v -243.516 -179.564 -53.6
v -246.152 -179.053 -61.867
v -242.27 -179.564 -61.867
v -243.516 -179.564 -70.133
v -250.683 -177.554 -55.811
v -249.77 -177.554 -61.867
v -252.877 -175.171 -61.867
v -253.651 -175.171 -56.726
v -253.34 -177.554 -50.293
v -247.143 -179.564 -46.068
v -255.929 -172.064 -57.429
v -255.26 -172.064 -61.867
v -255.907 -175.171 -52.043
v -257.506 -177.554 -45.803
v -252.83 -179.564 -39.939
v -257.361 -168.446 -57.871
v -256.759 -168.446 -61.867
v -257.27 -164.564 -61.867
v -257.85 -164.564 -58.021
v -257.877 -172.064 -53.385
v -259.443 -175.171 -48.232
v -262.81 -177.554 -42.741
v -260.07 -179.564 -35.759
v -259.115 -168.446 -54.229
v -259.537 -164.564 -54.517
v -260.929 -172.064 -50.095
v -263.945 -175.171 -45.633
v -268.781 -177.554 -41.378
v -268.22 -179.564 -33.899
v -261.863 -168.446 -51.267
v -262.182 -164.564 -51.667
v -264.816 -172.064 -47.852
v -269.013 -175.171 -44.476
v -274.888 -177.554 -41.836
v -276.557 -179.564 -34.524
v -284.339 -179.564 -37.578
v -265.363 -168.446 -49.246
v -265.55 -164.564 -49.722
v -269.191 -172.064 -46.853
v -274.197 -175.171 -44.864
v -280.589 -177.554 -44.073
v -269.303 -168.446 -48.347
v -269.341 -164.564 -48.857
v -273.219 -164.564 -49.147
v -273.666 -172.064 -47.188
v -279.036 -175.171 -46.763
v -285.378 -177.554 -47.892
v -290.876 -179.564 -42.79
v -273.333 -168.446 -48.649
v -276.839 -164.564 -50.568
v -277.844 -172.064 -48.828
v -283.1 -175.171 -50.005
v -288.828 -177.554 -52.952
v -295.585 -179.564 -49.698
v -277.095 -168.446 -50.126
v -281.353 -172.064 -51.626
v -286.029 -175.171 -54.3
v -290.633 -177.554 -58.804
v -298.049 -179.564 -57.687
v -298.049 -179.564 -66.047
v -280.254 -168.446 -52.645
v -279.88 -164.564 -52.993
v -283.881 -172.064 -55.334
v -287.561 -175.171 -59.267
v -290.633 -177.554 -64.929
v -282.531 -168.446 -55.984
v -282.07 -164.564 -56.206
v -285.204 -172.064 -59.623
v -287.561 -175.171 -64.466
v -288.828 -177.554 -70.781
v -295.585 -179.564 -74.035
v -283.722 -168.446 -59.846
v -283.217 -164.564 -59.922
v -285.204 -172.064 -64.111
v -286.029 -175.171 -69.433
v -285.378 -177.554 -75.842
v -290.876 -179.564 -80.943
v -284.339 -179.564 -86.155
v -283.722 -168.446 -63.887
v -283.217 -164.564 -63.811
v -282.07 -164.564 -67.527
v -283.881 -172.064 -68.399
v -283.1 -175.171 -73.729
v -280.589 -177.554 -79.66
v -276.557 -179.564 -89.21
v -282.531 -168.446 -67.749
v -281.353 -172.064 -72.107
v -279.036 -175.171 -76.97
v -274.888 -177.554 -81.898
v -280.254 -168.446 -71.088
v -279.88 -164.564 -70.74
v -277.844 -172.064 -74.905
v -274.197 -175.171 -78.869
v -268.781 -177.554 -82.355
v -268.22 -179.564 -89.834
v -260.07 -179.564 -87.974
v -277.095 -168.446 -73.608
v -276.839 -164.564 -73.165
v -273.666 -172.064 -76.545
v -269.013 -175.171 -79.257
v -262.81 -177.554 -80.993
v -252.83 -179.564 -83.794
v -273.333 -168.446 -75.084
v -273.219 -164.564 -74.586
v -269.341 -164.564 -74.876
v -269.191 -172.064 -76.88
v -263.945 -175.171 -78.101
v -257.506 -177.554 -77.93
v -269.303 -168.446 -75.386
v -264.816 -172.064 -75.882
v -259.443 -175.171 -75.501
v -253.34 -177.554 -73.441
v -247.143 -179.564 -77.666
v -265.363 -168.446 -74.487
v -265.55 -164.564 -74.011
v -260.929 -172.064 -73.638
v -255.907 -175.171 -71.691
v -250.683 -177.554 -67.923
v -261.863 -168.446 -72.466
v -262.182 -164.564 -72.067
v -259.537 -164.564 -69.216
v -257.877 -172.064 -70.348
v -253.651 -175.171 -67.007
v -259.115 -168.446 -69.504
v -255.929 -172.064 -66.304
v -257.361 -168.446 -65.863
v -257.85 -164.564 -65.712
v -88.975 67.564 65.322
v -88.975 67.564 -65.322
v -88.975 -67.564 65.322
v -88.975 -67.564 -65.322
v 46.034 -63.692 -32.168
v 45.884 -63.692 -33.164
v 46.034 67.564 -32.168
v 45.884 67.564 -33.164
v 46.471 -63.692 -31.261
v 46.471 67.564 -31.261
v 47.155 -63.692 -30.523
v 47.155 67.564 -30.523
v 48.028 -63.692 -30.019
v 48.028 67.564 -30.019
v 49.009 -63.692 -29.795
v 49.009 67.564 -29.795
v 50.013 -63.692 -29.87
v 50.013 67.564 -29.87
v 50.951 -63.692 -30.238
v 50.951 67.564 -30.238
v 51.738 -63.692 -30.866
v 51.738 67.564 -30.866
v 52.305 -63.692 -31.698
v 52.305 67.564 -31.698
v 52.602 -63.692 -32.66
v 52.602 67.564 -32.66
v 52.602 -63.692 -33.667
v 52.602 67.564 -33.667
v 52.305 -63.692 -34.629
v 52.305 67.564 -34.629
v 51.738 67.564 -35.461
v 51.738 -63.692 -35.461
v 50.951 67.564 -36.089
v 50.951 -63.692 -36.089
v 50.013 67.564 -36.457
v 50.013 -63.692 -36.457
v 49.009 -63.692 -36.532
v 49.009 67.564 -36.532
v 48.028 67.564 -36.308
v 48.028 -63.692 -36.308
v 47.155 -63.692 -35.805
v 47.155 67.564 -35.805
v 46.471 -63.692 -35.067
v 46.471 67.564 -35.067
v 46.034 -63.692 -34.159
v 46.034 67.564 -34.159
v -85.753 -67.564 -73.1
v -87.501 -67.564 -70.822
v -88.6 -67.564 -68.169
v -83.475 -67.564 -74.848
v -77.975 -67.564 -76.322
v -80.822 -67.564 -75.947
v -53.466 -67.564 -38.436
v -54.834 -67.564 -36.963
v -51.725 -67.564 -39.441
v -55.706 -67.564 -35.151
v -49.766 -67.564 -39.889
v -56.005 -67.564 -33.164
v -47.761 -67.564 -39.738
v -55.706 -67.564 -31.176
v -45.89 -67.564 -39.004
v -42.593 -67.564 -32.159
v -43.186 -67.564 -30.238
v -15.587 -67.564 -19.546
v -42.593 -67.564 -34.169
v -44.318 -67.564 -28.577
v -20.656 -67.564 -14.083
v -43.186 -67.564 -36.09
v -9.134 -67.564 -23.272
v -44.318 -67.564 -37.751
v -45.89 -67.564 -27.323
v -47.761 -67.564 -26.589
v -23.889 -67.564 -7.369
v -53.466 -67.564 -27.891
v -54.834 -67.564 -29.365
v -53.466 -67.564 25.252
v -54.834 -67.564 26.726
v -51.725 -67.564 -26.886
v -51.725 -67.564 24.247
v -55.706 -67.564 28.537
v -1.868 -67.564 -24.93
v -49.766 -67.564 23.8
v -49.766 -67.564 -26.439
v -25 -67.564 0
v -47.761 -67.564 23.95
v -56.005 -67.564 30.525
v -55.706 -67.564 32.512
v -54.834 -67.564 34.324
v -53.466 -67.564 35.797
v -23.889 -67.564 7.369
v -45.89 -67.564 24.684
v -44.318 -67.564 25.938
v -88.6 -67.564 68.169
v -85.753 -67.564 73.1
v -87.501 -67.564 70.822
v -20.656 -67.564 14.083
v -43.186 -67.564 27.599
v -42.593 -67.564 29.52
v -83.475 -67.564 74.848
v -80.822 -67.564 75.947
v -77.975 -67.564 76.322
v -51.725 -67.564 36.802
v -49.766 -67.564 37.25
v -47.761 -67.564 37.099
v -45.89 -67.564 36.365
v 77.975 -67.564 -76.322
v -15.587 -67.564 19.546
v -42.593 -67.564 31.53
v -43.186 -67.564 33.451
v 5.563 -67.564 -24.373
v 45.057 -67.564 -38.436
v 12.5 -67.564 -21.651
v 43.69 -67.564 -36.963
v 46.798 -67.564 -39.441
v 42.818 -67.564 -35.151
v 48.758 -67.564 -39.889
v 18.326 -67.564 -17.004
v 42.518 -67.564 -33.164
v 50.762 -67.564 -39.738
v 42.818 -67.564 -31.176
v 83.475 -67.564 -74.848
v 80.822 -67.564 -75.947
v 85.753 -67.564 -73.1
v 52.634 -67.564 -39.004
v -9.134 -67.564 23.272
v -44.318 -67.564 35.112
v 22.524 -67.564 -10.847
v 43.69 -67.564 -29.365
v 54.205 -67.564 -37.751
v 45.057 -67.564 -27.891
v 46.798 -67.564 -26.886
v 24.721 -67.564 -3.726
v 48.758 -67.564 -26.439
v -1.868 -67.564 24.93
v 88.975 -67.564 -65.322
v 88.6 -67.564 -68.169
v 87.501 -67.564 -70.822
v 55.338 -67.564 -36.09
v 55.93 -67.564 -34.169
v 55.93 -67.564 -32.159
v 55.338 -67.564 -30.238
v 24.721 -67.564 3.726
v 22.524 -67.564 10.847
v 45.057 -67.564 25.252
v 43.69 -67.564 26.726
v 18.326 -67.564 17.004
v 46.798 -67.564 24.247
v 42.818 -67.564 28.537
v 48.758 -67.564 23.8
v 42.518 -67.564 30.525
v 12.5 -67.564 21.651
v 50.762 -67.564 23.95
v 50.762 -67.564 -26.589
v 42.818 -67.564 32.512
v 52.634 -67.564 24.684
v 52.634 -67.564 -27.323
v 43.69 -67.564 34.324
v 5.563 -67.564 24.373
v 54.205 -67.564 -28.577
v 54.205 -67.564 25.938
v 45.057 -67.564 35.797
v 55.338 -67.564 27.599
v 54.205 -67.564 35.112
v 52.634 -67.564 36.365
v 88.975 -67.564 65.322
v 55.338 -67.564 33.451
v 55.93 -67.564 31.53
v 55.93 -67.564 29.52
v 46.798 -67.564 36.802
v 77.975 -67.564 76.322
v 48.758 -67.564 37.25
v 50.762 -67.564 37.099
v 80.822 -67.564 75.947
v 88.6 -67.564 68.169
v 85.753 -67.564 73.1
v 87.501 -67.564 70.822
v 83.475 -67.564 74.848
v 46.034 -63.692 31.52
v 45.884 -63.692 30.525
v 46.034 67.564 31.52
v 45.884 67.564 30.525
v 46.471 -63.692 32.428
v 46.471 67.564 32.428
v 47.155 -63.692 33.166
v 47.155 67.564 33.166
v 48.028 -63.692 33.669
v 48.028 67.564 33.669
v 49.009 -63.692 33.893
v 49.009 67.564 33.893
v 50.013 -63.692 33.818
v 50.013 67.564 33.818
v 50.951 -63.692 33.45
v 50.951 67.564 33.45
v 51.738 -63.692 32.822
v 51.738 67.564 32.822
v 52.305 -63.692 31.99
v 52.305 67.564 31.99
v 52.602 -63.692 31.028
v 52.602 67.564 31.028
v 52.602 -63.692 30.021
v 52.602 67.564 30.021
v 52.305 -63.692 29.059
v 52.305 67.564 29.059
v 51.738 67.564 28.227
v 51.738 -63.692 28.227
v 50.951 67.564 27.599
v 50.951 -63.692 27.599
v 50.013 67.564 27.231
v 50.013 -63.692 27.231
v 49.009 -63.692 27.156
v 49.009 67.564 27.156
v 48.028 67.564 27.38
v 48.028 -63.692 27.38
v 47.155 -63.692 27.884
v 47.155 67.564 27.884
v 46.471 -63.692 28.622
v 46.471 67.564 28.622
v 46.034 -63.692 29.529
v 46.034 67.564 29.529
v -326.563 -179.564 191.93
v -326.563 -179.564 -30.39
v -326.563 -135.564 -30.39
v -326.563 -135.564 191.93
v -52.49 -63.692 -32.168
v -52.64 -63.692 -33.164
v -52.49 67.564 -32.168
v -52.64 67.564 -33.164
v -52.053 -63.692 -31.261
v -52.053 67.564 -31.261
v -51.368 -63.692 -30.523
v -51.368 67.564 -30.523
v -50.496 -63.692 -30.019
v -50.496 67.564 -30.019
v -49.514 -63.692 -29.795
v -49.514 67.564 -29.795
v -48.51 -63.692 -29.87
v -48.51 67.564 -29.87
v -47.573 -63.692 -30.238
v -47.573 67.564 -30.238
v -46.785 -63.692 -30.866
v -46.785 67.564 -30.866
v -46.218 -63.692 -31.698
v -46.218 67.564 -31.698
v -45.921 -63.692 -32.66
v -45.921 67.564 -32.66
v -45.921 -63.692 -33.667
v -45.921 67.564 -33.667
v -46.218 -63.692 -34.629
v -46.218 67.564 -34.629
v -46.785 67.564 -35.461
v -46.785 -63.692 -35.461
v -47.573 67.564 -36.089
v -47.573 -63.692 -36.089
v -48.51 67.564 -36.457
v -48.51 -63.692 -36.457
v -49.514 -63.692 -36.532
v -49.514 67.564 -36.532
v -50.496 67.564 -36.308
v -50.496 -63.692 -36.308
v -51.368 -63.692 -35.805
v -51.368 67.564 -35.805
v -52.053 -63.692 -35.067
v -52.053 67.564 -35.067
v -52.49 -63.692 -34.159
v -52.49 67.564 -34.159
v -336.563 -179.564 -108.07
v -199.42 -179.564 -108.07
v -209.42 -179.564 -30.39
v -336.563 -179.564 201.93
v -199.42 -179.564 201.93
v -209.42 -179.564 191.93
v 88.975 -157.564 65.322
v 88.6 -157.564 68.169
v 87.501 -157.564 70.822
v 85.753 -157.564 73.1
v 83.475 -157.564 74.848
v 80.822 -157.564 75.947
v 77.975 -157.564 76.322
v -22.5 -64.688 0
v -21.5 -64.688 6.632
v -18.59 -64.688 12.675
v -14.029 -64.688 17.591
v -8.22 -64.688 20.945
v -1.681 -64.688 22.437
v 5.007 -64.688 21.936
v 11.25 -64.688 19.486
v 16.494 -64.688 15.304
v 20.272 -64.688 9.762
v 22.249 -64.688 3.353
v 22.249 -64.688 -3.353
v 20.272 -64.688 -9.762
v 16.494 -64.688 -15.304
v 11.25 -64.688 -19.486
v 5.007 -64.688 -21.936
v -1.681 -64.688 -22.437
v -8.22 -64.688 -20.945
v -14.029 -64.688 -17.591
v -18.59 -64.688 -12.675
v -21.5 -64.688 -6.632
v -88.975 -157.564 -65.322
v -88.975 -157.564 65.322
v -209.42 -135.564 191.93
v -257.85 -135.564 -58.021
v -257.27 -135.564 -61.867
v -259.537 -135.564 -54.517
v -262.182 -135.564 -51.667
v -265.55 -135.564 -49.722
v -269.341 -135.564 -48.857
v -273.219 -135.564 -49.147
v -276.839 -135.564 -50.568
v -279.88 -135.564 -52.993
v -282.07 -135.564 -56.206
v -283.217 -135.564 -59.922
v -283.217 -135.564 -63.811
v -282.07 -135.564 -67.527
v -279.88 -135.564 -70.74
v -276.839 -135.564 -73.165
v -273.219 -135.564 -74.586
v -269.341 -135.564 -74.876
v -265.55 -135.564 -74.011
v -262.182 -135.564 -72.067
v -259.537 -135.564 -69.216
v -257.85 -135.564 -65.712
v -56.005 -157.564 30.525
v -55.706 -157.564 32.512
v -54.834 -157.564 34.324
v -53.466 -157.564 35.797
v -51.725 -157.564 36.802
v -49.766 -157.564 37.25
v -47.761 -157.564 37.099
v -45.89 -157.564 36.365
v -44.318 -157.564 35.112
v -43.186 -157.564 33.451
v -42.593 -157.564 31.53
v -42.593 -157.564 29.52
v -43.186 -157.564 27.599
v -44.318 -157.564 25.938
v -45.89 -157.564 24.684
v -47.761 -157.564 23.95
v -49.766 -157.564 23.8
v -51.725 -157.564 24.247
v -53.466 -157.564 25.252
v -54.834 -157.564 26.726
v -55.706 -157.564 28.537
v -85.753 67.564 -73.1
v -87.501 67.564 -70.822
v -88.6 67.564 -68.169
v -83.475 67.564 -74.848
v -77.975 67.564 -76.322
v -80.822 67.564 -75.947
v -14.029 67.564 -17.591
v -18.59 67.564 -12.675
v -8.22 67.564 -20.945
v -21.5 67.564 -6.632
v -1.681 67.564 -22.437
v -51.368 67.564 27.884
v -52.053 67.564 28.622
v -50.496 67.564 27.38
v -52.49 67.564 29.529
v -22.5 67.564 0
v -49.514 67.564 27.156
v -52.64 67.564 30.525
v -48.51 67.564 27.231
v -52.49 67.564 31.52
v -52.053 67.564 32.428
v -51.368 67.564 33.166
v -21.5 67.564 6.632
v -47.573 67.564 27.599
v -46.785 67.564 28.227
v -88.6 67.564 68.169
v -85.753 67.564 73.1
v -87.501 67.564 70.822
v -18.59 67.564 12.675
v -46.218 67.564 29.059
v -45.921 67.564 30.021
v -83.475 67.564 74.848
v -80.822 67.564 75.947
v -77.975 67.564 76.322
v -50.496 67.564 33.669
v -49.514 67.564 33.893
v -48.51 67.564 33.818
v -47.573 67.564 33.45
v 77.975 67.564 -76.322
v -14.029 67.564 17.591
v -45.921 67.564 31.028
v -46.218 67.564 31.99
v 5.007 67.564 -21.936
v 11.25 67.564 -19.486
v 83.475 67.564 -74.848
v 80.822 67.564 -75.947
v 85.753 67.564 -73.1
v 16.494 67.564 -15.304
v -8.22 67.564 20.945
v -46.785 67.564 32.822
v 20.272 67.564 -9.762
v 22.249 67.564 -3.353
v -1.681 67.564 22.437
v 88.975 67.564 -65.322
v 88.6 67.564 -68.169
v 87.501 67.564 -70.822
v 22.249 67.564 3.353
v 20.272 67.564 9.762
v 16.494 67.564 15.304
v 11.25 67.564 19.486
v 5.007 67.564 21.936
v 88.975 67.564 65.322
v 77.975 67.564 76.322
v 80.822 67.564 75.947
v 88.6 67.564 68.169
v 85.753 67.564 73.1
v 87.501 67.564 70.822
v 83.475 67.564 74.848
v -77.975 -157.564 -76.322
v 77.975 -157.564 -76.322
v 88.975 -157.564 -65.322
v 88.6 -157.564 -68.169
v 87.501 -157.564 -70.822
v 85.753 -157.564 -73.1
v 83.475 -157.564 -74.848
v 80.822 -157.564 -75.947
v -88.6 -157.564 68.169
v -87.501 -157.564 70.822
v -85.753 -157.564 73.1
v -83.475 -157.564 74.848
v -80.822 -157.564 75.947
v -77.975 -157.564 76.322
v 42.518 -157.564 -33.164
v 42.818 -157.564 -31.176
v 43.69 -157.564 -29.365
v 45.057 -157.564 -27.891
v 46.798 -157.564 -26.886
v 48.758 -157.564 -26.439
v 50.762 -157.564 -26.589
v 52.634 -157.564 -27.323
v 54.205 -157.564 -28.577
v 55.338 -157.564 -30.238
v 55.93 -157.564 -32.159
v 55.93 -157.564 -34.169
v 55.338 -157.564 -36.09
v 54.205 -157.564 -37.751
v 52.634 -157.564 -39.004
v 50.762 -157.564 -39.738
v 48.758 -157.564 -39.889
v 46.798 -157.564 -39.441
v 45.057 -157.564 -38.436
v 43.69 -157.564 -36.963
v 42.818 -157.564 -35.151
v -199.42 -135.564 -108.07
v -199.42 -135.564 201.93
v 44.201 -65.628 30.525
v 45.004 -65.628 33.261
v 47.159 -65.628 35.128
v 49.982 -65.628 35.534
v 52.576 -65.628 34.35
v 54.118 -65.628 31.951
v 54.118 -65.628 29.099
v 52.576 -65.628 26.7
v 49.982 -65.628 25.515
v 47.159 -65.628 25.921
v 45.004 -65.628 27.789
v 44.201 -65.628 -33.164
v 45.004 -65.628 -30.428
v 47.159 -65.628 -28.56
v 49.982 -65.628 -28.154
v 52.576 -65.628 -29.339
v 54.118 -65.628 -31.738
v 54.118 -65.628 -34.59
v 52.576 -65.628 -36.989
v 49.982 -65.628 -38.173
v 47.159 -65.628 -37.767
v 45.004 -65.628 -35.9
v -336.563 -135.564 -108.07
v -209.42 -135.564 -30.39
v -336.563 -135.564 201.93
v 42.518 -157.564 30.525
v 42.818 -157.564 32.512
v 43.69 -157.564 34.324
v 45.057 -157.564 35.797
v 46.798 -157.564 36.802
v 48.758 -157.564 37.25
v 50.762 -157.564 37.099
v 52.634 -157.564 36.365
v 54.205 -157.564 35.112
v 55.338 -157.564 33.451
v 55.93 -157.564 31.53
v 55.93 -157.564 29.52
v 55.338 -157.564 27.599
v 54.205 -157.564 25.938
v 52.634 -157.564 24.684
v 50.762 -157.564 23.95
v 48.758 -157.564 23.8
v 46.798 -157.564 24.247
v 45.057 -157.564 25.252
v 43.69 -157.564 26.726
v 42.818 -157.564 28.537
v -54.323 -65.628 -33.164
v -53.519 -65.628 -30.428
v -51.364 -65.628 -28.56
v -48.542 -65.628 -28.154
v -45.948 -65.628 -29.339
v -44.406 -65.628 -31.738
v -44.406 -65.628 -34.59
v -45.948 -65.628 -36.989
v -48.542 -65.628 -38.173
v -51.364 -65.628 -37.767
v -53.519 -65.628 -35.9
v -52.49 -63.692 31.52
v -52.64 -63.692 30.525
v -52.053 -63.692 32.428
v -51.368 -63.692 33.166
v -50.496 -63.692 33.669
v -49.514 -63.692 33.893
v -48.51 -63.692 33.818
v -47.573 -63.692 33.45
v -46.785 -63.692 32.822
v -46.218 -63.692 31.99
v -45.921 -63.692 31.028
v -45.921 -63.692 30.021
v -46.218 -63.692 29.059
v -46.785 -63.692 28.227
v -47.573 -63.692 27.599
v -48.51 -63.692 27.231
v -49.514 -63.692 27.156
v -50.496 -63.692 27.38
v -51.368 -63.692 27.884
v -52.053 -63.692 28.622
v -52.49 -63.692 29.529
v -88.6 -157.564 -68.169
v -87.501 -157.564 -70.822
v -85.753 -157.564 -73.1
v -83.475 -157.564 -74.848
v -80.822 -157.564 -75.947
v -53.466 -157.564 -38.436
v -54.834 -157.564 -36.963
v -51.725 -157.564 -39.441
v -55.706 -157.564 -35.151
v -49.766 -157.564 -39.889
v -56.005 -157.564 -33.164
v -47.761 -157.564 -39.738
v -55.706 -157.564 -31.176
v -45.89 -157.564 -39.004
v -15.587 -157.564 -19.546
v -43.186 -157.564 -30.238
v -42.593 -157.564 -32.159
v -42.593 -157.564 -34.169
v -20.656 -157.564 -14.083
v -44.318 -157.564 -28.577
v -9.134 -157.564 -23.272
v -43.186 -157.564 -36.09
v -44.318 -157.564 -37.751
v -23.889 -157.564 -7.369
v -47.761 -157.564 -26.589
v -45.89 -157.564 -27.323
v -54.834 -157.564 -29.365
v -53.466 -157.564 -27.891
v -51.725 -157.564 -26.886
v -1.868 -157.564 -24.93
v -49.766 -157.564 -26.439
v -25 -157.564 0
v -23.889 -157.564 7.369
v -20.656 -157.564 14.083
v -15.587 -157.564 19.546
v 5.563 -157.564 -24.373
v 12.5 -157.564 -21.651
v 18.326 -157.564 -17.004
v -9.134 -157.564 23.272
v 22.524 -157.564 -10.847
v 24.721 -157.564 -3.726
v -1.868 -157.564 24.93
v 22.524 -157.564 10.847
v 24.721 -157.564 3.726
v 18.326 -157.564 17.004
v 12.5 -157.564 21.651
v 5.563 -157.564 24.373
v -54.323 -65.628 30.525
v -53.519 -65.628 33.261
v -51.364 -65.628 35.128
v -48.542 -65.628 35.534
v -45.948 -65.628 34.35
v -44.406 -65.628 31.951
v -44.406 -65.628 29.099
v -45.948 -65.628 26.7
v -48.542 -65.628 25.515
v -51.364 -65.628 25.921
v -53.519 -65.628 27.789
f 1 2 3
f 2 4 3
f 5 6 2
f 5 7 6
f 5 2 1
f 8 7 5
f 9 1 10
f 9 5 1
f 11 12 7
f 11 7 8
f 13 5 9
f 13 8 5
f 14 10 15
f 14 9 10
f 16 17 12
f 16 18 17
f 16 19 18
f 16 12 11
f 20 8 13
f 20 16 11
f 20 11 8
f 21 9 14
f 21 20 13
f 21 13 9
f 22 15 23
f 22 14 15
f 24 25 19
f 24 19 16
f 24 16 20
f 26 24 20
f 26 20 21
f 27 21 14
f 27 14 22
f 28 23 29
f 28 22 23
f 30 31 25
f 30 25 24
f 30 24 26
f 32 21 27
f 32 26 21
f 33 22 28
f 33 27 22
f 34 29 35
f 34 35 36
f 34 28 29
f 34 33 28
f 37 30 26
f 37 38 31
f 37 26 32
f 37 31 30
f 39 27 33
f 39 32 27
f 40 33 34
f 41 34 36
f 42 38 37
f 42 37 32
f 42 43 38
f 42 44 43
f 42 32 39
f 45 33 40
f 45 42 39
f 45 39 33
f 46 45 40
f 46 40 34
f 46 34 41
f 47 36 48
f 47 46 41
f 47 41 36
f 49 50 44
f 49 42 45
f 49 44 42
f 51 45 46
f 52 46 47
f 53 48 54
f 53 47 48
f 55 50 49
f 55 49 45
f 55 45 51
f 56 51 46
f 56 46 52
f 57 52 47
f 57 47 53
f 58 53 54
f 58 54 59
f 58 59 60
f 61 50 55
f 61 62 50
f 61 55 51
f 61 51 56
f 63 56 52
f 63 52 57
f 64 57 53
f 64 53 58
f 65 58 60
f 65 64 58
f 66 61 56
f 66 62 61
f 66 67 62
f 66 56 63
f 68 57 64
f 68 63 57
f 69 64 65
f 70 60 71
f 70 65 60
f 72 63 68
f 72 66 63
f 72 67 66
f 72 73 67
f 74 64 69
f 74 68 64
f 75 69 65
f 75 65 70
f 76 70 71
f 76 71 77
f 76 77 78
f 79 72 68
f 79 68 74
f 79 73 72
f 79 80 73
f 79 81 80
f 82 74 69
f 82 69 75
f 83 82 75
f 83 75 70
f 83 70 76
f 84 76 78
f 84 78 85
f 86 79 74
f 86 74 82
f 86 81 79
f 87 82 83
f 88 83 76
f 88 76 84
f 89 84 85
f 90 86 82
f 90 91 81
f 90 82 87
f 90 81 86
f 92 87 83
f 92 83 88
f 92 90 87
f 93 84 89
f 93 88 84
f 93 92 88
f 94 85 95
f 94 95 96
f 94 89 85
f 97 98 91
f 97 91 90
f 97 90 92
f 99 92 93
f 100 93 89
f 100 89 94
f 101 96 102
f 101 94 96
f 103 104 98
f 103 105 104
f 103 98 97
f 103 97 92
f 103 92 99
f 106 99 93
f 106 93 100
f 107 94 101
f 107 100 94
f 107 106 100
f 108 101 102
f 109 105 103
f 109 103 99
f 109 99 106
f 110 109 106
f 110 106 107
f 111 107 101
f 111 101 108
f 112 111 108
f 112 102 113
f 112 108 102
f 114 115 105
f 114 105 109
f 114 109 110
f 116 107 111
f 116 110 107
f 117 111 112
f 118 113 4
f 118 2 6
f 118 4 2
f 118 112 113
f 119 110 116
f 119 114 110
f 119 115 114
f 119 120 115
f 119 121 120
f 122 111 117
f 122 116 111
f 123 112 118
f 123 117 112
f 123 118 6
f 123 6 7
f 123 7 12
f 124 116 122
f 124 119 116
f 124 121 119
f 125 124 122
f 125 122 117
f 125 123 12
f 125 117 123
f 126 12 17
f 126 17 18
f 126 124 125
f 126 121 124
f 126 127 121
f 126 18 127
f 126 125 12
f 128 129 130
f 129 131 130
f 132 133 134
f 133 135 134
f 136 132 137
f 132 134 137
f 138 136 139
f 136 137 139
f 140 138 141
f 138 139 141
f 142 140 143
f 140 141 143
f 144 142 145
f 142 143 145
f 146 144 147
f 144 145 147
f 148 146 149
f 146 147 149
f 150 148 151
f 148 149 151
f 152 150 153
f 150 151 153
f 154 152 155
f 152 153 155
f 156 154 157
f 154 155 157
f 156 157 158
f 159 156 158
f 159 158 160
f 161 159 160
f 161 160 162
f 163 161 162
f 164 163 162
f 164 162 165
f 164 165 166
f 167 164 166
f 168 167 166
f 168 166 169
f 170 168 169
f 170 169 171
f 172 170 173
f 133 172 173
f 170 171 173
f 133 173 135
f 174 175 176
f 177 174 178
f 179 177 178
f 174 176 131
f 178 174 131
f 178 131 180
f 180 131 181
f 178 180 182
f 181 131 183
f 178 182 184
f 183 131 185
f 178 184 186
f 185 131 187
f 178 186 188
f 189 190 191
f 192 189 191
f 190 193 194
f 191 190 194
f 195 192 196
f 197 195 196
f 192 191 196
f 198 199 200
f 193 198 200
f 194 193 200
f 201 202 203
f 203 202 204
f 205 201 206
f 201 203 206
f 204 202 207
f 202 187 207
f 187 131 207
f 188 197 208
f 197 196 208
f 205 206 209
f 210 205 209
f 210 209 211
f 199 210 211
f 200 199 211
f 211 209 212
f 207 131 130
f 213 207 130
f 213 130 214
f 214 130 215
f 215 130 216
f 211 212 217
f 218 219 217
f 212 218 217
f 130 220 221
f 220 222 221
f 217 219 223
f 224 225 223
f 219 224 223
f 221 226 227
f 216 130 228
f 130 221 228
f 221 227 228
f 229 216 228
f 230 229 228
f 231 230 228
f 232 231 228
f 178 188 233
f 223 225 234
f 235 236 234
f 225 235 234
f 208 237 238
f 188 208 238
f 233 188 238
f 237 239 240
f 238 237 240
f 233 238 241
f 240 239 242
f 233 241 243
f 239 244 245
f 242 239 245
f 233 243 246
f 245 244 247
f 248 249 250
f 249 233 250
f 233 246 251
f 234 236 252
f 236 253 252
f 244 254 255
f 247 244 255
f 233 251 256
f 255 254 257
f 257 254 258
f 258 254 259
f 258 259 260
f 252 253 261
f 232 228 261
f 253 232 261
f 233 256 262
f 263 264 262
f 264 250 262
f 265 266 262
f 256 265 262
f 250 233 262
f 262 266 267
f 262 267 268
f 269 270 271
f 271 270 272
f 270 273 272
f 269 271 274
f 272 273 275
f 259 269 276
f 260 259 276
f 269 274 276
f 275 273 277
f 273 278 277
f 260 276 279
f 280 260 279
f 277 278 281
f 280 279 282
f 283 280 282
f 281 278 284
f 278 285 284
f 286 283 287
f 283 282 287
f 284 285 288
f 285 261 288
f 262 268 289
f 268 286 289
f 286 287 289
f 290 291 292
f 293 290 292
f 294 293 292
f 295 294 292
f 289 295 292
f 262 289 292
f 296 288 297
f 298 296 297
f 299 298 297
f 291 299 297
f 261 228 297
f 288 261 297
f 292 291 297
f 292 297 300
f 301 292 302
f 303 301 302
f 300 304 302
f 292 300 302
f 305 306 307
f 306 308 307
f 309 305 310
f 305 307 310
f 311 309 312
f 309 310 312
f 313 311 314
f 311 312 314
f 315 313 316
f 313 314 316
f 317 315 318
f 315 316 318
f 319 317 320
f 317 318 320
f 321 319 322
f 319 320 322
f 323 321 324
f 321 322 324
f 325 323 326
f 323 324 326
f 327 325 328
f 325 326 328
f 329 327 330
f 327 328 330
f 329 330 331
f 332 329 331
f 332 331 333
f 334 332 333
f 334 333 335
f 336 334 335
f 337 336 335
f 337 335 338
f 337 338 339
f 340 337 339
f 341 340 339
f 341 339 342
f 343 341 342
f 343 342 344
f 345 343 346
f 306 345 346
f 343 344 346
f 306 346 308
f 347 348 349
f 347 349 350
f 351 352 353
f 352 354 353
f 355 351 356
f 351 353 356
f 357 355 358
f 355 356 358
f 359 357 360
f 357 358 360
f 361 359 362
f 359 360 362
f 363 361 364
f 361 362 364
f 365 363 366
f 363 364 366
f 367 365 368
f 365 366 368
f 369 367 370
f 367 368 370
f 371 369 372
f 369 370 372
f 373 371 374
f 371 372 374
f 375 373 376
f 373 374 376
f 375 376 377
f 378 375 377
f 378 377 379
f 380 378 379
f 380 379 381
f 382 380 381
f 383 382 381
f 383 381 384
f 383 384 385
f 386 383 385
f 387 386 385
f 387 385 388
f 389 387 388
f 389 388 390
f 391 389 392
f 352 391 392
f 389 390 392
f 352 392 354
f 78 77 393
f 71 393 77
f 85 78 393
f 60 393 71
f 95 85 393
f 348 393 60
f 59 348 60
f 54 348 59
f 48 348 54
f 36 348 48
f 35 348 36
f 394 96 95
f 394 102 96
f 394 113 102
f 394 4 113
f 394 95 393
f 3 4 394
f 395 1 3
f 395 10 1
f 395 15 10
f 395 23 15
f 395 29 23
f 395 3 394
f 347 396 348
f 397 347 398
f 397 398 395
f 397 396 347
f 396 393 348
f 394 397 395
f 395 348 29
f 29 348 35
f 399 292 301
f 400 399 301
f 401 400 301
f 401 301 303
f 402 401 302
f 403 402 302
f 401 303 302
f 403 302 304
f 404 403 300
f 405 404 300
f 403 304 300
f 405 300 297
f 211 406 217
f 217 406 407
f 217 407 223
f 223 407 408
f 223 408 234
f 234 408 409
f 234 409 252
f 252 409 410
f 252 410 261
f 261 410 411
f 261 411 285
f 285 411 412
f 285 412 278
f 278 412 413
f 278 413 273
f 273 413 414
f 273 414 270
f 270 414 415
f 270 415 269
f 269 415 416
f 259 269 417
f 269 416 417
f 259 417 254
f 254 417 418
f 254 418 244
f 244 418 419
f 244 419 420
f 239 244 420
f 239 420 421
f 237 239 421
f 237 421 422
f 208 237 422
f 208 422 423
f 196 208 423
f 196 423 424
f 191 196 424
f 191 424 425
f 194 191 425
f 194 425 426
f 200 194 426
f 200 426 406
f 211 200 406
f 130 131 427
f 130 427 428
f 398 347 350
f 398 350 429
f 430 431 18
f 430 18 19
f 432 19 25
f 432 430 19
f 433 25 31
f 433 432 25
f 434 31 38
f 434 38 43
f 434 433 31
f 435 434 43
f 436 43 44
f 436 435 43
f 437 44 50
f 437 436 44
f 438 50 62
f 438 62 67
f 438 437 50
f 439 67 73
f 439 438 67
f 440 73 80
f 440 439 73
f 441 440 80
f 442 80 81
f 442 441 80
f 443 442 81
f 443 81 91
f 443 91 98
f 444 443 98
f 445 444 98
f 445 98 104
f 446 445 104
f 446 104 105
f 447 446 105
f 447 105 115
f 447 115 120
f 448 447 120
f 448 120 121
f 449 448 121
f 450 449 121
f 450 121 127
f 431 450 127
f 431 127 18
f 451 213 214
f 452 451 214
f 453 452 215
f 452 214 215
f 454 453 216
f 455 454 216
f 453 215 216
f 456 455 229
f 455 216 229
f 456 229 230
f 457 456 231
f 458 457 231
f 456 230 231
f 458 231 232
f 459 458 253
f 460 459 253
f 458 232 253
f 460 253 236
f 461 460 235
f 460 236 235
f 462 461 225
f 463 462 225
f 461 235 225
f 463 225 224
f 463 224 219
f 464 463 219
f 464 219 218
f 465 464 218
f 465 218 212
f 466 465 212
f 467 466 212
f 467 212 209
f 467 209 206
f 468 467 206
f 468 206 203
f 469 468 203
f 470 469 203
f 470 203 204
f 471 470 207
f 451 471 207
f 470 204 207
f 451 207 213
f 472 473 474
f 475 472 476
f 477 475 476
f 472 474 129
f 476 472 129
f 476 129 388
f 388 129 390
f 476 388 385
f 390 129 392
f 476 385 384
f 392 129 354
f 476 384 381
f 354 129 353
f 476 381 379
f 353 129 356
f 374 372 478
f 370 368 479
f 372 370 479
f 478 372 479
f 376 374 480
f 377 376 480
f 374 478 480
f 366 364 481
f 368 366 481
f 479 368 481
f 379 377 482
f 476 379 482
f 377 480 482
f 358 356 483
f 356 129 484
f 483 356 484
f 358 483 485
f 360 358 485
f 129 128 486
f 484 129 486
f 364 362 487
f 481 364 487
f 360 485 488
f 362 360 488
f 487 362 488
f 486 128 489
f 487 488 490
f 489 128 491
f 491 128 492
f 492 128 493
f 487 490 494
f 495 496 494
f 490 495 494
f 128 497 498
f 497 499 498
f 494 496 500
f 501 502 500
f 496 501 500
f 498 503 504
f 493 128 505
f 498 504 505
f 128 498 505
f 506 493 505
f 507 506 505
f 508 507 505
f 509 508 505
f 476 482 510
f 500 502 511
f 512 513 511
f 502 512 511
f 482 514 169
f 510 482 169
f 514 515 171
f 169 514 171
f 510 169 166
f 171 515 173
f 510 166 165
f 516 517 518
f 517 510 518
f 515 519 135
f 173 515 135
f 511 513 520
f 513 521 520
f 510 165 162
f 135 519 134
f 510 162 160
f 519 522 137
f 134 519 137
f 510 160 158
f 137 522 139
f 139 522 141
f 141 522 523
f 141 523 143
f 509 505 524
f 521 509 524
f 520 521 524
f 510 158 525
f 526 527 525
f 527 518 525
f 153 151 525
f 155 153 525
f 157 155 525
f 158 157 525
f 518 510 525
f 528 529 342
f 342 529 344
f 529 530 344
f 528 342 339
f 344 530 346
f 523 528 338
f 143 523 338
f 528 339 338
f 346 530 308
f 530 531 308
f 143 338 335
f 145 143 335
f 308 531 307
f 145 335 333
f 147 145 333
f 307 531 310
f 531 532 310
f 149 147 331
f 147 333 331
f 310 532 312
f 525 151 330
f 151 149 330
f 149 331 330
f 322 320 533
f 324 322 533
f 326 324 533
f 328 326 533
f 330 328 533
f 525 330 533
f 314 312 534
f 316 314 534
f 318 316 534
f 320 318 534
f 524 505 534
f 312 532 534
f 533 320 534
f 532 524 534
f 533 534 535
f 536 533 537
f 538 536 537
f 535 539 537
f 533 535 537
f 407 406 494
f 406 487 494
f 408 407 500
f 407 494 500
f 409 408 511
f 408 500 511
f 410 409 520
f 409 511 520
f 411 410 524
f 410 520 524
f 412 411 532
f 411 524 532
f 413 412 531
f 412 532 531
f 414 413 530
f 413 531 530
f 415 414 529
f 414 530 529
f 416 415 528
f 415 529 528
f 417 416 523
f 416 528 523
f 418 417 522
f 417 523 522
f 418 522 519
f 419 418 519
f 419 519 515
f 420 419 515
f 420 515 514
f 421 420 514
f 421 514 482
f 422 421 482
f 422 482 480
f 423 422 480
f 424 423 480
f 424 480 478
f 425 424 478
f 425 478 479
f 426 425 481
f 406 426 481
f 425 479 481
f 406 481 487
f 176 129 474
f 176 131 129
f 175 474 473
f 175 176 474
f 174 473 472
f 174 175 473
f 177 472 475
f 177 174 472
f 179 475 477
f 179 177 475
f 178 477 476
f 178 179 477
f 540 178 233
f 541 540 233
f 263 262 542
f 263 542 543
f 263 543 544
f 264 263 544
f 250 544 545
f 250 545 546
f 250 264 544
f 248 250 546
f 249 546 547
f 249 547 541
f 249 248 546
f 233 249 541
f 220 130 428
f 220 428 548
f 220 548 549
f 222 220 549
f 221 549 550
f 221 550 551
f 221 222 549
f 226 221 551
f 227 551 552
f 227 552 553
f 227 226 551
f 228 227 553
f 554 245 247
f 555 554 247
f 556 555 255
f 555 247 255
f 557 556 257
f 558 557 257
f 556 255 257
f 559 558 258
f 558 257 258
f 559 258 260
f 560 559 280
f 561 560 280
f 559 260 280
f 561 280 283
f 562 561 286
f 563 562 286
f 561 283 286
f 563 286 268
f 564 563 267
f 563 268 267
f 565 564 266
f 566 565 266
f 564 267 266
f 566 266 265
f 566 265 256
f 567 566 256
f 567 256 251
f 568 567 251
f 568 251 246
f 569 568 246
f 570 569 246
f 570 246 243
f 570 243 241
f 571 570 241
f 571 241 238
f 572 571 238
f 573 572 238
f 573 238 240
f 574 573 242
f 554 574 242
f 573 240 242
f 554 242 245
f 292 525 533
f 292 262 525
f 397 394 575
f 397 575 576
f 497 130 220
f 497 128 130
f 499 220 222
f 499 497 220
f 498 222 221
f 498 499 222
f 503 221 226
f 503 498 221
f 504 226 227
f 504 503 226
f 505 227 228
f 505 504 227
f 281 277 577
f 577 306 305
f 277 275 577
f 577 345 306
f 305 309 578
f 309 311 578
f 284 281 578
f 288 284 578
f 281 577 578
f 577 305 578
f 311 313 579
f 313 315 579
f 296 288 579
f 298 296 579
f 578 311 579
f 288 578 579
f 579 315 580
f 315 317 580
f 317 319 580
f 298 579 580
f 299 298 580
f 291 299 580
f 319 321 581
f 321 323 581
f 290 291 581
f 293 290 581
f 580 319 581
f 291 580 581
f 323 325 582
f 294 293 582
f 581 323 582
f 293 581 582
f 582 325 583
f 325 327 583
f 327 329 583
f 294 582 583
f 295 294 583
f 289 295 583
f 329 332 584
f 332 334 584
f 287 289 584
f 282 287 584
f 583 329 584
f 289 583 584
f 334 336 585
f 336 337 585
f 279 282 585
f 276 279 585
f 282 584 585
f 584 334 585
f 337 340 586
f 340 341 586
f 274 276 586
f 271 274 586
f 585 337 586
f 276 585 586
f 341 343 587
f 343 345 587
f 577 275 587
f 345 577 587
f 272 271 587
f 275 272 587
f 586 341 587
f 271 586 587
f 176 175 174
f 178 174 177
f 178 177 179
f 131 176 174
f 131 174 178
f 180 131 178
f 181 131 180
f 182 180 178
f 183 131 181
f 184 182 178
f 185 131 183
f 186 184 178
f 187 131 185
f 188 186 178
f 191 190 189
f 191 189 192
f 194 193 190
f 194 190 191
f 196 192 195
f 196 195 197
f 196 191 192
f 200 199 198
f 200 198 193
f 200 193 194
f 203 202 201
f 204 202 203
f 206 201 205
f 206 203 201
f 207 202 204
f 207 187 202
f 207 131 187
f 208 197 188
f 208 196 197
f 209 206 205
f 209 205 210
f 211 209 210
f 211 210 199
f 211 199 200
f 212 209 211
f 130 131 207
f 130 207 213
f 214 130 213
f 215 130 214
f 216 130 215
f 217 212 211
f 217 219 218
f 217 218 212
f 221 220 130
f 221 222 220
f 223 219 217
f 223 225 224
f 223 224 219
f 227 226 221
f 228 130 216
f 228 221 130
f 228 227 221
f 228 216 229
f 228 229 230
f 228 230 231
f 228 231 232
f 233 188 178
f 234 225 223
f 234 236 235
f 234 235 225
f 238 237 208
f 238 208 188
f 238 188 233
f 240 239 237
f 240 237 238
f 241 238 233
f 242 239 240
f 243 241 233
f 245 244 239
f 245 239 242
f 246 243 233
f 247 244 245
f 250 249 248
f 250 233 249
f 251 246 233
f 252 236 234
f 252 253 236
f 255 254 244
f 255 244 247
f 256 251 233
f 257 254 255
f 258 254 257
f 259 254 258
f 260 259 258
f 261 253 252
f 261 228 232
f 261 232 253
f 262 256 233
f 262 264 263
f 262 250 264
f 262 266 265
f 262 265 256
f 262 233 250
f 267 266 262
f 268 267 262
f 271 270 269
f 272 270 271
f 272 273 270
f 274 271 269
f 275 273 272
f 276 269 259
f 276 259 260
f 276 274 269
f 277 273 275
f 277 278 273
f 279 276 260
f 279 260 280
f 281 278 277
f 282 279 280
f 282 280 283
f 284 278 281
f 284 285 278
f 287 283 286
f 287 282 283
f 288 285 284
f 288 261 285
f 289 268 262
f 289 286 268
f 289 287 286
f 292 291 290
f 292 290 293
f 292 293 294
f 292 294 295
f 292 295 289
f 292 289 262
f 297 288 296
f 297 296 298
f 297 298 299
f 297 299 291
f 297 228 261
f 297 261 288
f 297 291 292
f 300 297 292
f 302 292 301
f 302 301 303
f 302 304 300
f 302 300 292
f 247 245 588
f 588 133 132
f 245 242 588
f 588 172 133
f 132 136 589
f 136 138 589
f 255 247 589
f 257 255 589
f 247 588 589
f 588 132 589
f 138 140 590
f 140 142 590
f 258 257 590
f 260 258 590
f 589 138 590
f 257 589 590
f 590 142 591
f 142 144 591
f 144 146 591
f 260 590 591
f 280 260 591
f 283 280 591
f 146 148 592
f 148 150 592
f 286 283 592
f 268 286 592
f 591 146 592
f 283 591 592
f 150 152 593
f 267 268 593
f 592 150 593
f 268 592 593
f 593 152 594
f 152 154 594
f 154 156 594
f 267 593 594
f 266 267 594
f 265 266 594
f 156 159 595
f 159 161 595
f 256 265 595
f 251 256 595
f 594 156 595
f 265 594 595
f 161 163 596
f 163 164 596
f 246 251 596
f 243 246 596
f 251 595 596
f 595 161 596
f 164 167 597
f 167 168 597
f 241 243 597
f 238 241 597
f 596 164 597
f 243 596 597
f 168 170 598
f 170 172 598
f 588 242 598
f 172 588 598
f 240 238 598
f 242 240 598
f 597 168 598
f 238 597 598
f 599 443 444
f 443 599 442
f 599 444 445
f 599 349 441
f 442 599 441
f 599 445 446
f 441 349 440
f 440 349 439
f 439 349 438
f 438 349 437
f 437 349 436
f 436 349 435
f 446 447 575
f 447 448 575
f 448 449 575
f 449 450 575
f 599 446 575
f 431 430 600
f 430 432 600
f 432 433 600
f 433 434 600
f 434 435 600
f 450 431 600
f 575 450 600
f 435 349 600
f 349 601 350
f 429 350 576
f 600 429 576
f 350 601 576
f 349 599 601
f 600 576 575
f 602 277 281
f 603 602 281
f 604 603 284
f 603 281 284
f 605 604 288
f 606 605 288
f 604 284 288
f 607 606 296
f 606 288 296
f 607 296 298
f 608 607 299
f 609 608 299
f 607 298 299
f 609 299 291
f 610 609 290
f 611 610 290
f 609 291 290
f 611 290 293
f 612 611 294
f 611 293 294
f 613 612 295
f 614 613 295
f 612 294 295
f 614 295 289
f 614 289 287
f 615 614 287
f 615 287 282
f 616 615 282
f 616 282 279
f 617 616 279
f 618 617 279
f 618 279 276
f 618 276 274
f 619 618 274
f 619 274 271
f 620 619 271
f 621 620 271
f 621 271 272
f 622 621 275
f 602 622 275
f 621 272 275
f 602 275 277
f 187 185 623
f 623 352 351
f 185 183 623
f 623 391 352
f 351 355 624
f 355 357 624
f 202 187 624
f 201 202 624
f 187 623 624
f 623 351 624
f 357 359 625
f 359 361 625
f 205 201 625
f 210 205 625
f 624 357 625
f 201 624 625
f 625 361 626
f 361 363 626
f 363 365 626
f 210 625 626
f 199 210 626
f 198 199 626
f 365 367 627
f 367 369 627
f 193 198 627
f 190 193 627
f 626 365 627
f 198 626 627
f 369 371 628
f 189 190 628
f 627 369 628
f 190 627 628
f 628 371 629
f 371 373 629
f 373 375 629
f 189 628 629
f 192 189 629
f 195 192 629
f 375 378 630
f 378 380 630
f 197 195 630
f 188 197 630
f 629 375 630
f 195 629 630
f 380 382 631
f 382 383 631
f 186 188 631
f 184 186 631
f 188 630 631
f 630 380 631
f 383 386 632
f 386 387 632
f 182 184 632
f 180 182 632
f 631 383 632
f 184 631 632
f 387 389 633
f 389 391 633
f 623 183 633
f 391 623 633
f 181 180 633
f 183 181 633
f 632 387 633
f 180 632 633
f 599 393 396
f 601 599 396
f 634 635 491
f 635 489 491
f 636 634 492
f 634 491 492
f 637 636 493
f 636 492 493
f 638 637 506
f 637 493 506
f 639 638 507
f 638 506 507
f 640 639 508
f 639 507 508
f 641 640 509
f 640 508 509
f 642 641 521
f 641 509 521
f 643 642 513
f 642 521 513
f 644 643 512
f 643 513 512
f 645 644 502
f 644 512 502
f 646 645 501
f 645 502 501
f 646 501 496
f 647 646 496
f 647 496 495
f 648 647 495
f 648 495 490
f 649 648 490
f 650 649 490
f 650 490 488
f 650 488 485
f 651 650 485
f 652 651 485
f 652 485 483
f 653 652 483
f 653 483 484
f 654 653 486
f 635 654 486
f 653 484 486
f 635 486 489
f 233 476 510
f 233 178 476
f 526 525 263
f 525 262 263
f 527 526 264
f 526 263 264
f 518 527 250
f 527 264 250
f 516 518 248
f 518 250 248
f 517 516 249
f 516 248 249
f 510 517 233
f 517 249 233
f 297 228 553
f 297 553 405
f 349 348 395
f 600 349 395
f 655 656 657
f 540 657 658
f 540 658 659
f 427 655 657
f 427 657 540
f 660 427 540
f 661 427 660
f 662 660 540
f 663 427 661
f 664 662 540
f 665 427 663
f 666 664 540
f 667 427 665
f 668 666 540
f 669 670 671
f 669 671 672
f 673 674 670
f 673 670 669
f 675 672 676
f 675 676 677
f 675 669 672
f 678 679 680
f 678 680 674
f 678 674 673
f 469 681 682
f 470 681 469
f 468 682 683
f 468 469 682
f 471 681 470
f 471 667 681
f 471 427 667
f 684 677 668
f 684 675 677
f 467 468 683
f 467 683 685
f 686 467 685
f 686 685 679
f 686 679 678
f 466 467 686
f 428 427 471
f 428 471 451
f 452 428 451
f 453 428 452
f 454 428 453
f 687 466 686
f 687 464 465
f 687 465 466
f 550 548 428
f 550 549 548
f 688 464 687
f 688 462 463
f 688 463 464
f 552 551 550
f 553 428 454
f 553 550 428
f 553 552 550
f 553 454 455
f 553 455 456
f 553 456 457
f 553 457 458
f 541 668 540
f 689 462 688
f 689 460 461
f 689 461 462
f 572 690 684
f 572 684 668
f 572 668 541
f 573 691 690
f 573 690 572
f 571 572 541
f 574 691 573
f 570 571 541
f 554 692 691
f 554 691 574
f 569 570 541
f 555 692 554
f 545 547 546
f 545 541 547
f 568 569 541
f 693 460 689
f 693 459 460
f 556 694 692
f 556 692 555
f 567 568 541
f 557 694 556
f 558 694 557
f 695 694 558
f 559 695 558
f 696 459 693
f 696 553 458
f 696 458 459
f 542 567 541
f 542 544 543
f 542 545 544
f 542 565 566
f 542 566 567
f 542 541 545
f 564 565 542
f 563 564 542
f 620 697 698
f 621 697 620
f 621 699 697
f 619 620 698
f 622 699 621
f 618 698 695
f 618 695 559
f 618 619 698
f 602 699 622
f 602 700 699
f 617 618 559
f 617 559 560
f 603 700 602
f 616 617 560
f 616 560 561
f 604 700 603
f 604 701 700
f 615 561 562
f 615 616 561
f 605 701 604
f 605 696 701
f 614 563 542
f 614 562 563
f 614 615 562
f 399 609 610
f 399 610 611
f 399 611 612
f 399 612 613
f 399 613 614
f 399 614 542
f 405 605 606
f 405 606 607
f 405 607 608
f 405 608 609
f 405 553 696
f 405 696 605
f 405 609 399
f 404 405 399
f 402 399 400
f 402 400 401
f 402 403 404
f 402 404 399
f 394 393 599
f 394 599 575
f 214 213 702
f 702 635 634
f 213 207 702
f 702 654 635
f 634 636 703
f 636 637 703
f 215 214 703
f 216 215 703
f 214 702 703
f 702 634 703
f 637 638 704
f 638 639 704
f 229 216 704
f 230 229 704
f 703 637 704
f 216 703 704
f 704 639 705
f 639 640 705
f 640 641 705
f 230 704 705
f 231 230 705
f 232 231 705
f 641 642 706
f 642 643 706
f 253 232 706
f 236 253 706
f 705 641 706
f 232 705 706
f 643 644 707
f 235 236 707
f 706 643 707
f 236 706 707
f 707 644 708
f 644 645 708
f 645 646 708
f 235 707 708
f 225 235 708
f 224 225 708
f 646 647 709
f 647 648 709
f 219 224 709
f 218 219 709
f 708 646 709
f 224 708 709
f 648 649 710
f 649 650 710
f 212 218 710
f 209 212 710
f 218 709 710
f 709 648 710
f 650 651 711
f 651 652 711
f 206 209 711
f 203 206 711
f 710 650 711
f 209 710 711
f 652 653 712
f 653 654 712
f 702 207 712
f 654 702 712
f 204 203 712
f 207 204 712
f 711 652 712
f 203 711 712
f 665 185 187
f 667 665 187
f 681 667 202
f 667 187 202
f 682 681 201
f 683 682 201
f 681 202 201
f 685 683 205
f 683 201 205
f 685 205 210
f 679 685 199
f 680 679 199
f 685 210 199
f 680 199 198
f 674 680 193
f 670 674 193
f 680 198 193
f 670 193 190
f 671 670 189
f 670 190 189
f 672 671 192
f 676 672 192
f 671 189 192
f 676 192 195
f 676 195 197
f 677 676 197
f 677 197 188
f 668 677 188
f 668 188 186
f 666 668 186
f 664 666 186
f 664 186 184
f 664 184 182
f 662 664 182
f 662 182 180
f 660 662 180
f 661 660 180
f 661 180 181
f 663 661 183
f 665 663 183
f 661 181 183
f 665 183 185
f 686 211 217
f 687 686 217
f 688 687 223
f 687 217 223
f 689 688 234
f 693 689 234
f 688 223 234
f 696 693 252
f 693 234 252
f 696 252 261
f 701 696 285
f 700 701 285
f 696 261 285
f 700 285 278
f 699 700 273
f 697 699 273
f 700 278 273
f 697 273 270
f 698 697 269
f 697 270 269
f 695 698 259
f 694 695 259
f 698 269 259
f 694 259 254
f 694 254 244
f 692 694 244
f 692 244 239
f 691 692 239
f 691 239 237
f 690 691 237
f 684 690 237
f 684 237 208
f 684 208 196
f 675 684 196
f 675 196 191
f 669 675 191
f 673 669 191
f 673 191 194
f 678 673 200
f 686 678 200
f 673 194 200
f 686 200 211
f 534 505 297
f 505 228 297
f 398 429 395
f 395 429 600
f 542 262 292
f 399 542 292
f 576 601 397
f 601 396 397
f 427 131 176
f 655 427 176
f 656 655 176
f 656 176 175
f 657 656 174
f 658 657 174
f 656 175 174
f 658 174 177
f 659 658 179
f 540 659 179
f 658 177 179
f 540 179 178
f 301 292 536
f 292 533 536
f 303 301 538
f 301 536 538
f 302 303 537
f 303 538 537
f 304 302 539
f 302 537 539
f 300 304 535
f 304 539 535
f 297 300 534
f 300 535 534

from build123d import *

# Parameters (mm, degrees)
F0_W           = 177.9490709305
F0_H           = 152.6443958282
F1_DEPTH       = 67.564
F2_R           = 11
F4_D           = 6.7564
F4_CSINK_D     = 13.4874
F4_CSINK_ANGLE = 82
F6_D           = 45
F6_CSINK_D     = 50
F6_CSINK_ANGLE = 82
F7_DEPTH       = 90
F8_W           = 137.1426898649
F8_H           = 309.9995861312
F8_W_2         = 117.1426898649
F8_H_2         = 67.6793738137
F8_R           = 13.0462030276
F9_DEPTH       = 22
F10_R          = 15


with BuildPart() as f1:
    # F0 (on Front) → F1 (new body, symmetric)
    with BuildSketch(Plane.XZ):
        Rectangle(F0_W, F0_H)
    extrude(amount=F1_DEPTH, both=True)

    # F2
    f2_edges = [f1.edges().sort_by_distance(p)[0] for p in [
        (88.974535, 0, 76.322198),
        (88.974535, 0, -76.322198),
        (-88.974535, 0, -76.322198),
        (-88.974535, 0, 76.322198),
    ]]
    fillet(f2_edges, radius=F2_R)

    # F4 (through all)
    with Locations(Plane.XZ.offset(67.564)):
        with Locations((-49.2617487907, 30.5246915668), (49.2617487907, 30.5246915668), (49.2617487907, -33.1637137569), (-49.2617487907, -33.1637137569)):
            CounterSinkHole(F4_D / 2, F4_CSINK_D / 2, counter_sink_angle=F4_CSINK_ANGLE)

    # F6 (through all)
    with Locations(Plane.XZ.offset(67.564)):
        with Locations((0, 0)):
            CounterSinkHole(F6_D / 2, F6_CSINK_D / 2, counter_sink_angle=F6_CSINK_ANGLE)


with BuildPart() as f7:
    # F7 (new): a face of the model
    f7_faces = [f1.part.faces().sort_by_distance(p)[0] for p in [
        (0, -67.564, 73.9777111169),
    ]]
    extrude(f7_faces, amount=F7_DEPTH)


with BuildPart() as f9:
    # F8 (on face) → F9 (new body, symmetric)
    with BuildSketch(Plane.XZ.offset(157.564)):
        with Locations((-267.991155386, 46.9301007688)):
            Rectangle(F8_W, F8_H)
        Polygon((-326.5625003184, -30.3903184831), (-326.5625003184, 191.9298938344), (-209.4198104535, 191.9298938344), (-209.4198104535, -30.3903184831), (-209.4198104535, -98.0696922968), (-326.5625003184, -98.0696922968), align=None, mode=Mode.SUBTRACT)
        with Locations((-267.991155386, -64.2300053899)):
            Rectangle(F8_W_2, F8_H_2)
        with Locations((-270.3162431717, -61.8666037917)):
            Circle(F8_R, mode=Mode.SUBTRACT)
    extrude(amount=F9_DEPTH, both=True)

    # F10
    f10_edges = [f9.edges().sort_by_distance(p)[0] for p in [
        (-283.362446, -179.564, -61.866604),
    ]]
    fillet(f10_edges, radius=F10_R)


solid = Compound([f1.part, f7.part, f9.part])
